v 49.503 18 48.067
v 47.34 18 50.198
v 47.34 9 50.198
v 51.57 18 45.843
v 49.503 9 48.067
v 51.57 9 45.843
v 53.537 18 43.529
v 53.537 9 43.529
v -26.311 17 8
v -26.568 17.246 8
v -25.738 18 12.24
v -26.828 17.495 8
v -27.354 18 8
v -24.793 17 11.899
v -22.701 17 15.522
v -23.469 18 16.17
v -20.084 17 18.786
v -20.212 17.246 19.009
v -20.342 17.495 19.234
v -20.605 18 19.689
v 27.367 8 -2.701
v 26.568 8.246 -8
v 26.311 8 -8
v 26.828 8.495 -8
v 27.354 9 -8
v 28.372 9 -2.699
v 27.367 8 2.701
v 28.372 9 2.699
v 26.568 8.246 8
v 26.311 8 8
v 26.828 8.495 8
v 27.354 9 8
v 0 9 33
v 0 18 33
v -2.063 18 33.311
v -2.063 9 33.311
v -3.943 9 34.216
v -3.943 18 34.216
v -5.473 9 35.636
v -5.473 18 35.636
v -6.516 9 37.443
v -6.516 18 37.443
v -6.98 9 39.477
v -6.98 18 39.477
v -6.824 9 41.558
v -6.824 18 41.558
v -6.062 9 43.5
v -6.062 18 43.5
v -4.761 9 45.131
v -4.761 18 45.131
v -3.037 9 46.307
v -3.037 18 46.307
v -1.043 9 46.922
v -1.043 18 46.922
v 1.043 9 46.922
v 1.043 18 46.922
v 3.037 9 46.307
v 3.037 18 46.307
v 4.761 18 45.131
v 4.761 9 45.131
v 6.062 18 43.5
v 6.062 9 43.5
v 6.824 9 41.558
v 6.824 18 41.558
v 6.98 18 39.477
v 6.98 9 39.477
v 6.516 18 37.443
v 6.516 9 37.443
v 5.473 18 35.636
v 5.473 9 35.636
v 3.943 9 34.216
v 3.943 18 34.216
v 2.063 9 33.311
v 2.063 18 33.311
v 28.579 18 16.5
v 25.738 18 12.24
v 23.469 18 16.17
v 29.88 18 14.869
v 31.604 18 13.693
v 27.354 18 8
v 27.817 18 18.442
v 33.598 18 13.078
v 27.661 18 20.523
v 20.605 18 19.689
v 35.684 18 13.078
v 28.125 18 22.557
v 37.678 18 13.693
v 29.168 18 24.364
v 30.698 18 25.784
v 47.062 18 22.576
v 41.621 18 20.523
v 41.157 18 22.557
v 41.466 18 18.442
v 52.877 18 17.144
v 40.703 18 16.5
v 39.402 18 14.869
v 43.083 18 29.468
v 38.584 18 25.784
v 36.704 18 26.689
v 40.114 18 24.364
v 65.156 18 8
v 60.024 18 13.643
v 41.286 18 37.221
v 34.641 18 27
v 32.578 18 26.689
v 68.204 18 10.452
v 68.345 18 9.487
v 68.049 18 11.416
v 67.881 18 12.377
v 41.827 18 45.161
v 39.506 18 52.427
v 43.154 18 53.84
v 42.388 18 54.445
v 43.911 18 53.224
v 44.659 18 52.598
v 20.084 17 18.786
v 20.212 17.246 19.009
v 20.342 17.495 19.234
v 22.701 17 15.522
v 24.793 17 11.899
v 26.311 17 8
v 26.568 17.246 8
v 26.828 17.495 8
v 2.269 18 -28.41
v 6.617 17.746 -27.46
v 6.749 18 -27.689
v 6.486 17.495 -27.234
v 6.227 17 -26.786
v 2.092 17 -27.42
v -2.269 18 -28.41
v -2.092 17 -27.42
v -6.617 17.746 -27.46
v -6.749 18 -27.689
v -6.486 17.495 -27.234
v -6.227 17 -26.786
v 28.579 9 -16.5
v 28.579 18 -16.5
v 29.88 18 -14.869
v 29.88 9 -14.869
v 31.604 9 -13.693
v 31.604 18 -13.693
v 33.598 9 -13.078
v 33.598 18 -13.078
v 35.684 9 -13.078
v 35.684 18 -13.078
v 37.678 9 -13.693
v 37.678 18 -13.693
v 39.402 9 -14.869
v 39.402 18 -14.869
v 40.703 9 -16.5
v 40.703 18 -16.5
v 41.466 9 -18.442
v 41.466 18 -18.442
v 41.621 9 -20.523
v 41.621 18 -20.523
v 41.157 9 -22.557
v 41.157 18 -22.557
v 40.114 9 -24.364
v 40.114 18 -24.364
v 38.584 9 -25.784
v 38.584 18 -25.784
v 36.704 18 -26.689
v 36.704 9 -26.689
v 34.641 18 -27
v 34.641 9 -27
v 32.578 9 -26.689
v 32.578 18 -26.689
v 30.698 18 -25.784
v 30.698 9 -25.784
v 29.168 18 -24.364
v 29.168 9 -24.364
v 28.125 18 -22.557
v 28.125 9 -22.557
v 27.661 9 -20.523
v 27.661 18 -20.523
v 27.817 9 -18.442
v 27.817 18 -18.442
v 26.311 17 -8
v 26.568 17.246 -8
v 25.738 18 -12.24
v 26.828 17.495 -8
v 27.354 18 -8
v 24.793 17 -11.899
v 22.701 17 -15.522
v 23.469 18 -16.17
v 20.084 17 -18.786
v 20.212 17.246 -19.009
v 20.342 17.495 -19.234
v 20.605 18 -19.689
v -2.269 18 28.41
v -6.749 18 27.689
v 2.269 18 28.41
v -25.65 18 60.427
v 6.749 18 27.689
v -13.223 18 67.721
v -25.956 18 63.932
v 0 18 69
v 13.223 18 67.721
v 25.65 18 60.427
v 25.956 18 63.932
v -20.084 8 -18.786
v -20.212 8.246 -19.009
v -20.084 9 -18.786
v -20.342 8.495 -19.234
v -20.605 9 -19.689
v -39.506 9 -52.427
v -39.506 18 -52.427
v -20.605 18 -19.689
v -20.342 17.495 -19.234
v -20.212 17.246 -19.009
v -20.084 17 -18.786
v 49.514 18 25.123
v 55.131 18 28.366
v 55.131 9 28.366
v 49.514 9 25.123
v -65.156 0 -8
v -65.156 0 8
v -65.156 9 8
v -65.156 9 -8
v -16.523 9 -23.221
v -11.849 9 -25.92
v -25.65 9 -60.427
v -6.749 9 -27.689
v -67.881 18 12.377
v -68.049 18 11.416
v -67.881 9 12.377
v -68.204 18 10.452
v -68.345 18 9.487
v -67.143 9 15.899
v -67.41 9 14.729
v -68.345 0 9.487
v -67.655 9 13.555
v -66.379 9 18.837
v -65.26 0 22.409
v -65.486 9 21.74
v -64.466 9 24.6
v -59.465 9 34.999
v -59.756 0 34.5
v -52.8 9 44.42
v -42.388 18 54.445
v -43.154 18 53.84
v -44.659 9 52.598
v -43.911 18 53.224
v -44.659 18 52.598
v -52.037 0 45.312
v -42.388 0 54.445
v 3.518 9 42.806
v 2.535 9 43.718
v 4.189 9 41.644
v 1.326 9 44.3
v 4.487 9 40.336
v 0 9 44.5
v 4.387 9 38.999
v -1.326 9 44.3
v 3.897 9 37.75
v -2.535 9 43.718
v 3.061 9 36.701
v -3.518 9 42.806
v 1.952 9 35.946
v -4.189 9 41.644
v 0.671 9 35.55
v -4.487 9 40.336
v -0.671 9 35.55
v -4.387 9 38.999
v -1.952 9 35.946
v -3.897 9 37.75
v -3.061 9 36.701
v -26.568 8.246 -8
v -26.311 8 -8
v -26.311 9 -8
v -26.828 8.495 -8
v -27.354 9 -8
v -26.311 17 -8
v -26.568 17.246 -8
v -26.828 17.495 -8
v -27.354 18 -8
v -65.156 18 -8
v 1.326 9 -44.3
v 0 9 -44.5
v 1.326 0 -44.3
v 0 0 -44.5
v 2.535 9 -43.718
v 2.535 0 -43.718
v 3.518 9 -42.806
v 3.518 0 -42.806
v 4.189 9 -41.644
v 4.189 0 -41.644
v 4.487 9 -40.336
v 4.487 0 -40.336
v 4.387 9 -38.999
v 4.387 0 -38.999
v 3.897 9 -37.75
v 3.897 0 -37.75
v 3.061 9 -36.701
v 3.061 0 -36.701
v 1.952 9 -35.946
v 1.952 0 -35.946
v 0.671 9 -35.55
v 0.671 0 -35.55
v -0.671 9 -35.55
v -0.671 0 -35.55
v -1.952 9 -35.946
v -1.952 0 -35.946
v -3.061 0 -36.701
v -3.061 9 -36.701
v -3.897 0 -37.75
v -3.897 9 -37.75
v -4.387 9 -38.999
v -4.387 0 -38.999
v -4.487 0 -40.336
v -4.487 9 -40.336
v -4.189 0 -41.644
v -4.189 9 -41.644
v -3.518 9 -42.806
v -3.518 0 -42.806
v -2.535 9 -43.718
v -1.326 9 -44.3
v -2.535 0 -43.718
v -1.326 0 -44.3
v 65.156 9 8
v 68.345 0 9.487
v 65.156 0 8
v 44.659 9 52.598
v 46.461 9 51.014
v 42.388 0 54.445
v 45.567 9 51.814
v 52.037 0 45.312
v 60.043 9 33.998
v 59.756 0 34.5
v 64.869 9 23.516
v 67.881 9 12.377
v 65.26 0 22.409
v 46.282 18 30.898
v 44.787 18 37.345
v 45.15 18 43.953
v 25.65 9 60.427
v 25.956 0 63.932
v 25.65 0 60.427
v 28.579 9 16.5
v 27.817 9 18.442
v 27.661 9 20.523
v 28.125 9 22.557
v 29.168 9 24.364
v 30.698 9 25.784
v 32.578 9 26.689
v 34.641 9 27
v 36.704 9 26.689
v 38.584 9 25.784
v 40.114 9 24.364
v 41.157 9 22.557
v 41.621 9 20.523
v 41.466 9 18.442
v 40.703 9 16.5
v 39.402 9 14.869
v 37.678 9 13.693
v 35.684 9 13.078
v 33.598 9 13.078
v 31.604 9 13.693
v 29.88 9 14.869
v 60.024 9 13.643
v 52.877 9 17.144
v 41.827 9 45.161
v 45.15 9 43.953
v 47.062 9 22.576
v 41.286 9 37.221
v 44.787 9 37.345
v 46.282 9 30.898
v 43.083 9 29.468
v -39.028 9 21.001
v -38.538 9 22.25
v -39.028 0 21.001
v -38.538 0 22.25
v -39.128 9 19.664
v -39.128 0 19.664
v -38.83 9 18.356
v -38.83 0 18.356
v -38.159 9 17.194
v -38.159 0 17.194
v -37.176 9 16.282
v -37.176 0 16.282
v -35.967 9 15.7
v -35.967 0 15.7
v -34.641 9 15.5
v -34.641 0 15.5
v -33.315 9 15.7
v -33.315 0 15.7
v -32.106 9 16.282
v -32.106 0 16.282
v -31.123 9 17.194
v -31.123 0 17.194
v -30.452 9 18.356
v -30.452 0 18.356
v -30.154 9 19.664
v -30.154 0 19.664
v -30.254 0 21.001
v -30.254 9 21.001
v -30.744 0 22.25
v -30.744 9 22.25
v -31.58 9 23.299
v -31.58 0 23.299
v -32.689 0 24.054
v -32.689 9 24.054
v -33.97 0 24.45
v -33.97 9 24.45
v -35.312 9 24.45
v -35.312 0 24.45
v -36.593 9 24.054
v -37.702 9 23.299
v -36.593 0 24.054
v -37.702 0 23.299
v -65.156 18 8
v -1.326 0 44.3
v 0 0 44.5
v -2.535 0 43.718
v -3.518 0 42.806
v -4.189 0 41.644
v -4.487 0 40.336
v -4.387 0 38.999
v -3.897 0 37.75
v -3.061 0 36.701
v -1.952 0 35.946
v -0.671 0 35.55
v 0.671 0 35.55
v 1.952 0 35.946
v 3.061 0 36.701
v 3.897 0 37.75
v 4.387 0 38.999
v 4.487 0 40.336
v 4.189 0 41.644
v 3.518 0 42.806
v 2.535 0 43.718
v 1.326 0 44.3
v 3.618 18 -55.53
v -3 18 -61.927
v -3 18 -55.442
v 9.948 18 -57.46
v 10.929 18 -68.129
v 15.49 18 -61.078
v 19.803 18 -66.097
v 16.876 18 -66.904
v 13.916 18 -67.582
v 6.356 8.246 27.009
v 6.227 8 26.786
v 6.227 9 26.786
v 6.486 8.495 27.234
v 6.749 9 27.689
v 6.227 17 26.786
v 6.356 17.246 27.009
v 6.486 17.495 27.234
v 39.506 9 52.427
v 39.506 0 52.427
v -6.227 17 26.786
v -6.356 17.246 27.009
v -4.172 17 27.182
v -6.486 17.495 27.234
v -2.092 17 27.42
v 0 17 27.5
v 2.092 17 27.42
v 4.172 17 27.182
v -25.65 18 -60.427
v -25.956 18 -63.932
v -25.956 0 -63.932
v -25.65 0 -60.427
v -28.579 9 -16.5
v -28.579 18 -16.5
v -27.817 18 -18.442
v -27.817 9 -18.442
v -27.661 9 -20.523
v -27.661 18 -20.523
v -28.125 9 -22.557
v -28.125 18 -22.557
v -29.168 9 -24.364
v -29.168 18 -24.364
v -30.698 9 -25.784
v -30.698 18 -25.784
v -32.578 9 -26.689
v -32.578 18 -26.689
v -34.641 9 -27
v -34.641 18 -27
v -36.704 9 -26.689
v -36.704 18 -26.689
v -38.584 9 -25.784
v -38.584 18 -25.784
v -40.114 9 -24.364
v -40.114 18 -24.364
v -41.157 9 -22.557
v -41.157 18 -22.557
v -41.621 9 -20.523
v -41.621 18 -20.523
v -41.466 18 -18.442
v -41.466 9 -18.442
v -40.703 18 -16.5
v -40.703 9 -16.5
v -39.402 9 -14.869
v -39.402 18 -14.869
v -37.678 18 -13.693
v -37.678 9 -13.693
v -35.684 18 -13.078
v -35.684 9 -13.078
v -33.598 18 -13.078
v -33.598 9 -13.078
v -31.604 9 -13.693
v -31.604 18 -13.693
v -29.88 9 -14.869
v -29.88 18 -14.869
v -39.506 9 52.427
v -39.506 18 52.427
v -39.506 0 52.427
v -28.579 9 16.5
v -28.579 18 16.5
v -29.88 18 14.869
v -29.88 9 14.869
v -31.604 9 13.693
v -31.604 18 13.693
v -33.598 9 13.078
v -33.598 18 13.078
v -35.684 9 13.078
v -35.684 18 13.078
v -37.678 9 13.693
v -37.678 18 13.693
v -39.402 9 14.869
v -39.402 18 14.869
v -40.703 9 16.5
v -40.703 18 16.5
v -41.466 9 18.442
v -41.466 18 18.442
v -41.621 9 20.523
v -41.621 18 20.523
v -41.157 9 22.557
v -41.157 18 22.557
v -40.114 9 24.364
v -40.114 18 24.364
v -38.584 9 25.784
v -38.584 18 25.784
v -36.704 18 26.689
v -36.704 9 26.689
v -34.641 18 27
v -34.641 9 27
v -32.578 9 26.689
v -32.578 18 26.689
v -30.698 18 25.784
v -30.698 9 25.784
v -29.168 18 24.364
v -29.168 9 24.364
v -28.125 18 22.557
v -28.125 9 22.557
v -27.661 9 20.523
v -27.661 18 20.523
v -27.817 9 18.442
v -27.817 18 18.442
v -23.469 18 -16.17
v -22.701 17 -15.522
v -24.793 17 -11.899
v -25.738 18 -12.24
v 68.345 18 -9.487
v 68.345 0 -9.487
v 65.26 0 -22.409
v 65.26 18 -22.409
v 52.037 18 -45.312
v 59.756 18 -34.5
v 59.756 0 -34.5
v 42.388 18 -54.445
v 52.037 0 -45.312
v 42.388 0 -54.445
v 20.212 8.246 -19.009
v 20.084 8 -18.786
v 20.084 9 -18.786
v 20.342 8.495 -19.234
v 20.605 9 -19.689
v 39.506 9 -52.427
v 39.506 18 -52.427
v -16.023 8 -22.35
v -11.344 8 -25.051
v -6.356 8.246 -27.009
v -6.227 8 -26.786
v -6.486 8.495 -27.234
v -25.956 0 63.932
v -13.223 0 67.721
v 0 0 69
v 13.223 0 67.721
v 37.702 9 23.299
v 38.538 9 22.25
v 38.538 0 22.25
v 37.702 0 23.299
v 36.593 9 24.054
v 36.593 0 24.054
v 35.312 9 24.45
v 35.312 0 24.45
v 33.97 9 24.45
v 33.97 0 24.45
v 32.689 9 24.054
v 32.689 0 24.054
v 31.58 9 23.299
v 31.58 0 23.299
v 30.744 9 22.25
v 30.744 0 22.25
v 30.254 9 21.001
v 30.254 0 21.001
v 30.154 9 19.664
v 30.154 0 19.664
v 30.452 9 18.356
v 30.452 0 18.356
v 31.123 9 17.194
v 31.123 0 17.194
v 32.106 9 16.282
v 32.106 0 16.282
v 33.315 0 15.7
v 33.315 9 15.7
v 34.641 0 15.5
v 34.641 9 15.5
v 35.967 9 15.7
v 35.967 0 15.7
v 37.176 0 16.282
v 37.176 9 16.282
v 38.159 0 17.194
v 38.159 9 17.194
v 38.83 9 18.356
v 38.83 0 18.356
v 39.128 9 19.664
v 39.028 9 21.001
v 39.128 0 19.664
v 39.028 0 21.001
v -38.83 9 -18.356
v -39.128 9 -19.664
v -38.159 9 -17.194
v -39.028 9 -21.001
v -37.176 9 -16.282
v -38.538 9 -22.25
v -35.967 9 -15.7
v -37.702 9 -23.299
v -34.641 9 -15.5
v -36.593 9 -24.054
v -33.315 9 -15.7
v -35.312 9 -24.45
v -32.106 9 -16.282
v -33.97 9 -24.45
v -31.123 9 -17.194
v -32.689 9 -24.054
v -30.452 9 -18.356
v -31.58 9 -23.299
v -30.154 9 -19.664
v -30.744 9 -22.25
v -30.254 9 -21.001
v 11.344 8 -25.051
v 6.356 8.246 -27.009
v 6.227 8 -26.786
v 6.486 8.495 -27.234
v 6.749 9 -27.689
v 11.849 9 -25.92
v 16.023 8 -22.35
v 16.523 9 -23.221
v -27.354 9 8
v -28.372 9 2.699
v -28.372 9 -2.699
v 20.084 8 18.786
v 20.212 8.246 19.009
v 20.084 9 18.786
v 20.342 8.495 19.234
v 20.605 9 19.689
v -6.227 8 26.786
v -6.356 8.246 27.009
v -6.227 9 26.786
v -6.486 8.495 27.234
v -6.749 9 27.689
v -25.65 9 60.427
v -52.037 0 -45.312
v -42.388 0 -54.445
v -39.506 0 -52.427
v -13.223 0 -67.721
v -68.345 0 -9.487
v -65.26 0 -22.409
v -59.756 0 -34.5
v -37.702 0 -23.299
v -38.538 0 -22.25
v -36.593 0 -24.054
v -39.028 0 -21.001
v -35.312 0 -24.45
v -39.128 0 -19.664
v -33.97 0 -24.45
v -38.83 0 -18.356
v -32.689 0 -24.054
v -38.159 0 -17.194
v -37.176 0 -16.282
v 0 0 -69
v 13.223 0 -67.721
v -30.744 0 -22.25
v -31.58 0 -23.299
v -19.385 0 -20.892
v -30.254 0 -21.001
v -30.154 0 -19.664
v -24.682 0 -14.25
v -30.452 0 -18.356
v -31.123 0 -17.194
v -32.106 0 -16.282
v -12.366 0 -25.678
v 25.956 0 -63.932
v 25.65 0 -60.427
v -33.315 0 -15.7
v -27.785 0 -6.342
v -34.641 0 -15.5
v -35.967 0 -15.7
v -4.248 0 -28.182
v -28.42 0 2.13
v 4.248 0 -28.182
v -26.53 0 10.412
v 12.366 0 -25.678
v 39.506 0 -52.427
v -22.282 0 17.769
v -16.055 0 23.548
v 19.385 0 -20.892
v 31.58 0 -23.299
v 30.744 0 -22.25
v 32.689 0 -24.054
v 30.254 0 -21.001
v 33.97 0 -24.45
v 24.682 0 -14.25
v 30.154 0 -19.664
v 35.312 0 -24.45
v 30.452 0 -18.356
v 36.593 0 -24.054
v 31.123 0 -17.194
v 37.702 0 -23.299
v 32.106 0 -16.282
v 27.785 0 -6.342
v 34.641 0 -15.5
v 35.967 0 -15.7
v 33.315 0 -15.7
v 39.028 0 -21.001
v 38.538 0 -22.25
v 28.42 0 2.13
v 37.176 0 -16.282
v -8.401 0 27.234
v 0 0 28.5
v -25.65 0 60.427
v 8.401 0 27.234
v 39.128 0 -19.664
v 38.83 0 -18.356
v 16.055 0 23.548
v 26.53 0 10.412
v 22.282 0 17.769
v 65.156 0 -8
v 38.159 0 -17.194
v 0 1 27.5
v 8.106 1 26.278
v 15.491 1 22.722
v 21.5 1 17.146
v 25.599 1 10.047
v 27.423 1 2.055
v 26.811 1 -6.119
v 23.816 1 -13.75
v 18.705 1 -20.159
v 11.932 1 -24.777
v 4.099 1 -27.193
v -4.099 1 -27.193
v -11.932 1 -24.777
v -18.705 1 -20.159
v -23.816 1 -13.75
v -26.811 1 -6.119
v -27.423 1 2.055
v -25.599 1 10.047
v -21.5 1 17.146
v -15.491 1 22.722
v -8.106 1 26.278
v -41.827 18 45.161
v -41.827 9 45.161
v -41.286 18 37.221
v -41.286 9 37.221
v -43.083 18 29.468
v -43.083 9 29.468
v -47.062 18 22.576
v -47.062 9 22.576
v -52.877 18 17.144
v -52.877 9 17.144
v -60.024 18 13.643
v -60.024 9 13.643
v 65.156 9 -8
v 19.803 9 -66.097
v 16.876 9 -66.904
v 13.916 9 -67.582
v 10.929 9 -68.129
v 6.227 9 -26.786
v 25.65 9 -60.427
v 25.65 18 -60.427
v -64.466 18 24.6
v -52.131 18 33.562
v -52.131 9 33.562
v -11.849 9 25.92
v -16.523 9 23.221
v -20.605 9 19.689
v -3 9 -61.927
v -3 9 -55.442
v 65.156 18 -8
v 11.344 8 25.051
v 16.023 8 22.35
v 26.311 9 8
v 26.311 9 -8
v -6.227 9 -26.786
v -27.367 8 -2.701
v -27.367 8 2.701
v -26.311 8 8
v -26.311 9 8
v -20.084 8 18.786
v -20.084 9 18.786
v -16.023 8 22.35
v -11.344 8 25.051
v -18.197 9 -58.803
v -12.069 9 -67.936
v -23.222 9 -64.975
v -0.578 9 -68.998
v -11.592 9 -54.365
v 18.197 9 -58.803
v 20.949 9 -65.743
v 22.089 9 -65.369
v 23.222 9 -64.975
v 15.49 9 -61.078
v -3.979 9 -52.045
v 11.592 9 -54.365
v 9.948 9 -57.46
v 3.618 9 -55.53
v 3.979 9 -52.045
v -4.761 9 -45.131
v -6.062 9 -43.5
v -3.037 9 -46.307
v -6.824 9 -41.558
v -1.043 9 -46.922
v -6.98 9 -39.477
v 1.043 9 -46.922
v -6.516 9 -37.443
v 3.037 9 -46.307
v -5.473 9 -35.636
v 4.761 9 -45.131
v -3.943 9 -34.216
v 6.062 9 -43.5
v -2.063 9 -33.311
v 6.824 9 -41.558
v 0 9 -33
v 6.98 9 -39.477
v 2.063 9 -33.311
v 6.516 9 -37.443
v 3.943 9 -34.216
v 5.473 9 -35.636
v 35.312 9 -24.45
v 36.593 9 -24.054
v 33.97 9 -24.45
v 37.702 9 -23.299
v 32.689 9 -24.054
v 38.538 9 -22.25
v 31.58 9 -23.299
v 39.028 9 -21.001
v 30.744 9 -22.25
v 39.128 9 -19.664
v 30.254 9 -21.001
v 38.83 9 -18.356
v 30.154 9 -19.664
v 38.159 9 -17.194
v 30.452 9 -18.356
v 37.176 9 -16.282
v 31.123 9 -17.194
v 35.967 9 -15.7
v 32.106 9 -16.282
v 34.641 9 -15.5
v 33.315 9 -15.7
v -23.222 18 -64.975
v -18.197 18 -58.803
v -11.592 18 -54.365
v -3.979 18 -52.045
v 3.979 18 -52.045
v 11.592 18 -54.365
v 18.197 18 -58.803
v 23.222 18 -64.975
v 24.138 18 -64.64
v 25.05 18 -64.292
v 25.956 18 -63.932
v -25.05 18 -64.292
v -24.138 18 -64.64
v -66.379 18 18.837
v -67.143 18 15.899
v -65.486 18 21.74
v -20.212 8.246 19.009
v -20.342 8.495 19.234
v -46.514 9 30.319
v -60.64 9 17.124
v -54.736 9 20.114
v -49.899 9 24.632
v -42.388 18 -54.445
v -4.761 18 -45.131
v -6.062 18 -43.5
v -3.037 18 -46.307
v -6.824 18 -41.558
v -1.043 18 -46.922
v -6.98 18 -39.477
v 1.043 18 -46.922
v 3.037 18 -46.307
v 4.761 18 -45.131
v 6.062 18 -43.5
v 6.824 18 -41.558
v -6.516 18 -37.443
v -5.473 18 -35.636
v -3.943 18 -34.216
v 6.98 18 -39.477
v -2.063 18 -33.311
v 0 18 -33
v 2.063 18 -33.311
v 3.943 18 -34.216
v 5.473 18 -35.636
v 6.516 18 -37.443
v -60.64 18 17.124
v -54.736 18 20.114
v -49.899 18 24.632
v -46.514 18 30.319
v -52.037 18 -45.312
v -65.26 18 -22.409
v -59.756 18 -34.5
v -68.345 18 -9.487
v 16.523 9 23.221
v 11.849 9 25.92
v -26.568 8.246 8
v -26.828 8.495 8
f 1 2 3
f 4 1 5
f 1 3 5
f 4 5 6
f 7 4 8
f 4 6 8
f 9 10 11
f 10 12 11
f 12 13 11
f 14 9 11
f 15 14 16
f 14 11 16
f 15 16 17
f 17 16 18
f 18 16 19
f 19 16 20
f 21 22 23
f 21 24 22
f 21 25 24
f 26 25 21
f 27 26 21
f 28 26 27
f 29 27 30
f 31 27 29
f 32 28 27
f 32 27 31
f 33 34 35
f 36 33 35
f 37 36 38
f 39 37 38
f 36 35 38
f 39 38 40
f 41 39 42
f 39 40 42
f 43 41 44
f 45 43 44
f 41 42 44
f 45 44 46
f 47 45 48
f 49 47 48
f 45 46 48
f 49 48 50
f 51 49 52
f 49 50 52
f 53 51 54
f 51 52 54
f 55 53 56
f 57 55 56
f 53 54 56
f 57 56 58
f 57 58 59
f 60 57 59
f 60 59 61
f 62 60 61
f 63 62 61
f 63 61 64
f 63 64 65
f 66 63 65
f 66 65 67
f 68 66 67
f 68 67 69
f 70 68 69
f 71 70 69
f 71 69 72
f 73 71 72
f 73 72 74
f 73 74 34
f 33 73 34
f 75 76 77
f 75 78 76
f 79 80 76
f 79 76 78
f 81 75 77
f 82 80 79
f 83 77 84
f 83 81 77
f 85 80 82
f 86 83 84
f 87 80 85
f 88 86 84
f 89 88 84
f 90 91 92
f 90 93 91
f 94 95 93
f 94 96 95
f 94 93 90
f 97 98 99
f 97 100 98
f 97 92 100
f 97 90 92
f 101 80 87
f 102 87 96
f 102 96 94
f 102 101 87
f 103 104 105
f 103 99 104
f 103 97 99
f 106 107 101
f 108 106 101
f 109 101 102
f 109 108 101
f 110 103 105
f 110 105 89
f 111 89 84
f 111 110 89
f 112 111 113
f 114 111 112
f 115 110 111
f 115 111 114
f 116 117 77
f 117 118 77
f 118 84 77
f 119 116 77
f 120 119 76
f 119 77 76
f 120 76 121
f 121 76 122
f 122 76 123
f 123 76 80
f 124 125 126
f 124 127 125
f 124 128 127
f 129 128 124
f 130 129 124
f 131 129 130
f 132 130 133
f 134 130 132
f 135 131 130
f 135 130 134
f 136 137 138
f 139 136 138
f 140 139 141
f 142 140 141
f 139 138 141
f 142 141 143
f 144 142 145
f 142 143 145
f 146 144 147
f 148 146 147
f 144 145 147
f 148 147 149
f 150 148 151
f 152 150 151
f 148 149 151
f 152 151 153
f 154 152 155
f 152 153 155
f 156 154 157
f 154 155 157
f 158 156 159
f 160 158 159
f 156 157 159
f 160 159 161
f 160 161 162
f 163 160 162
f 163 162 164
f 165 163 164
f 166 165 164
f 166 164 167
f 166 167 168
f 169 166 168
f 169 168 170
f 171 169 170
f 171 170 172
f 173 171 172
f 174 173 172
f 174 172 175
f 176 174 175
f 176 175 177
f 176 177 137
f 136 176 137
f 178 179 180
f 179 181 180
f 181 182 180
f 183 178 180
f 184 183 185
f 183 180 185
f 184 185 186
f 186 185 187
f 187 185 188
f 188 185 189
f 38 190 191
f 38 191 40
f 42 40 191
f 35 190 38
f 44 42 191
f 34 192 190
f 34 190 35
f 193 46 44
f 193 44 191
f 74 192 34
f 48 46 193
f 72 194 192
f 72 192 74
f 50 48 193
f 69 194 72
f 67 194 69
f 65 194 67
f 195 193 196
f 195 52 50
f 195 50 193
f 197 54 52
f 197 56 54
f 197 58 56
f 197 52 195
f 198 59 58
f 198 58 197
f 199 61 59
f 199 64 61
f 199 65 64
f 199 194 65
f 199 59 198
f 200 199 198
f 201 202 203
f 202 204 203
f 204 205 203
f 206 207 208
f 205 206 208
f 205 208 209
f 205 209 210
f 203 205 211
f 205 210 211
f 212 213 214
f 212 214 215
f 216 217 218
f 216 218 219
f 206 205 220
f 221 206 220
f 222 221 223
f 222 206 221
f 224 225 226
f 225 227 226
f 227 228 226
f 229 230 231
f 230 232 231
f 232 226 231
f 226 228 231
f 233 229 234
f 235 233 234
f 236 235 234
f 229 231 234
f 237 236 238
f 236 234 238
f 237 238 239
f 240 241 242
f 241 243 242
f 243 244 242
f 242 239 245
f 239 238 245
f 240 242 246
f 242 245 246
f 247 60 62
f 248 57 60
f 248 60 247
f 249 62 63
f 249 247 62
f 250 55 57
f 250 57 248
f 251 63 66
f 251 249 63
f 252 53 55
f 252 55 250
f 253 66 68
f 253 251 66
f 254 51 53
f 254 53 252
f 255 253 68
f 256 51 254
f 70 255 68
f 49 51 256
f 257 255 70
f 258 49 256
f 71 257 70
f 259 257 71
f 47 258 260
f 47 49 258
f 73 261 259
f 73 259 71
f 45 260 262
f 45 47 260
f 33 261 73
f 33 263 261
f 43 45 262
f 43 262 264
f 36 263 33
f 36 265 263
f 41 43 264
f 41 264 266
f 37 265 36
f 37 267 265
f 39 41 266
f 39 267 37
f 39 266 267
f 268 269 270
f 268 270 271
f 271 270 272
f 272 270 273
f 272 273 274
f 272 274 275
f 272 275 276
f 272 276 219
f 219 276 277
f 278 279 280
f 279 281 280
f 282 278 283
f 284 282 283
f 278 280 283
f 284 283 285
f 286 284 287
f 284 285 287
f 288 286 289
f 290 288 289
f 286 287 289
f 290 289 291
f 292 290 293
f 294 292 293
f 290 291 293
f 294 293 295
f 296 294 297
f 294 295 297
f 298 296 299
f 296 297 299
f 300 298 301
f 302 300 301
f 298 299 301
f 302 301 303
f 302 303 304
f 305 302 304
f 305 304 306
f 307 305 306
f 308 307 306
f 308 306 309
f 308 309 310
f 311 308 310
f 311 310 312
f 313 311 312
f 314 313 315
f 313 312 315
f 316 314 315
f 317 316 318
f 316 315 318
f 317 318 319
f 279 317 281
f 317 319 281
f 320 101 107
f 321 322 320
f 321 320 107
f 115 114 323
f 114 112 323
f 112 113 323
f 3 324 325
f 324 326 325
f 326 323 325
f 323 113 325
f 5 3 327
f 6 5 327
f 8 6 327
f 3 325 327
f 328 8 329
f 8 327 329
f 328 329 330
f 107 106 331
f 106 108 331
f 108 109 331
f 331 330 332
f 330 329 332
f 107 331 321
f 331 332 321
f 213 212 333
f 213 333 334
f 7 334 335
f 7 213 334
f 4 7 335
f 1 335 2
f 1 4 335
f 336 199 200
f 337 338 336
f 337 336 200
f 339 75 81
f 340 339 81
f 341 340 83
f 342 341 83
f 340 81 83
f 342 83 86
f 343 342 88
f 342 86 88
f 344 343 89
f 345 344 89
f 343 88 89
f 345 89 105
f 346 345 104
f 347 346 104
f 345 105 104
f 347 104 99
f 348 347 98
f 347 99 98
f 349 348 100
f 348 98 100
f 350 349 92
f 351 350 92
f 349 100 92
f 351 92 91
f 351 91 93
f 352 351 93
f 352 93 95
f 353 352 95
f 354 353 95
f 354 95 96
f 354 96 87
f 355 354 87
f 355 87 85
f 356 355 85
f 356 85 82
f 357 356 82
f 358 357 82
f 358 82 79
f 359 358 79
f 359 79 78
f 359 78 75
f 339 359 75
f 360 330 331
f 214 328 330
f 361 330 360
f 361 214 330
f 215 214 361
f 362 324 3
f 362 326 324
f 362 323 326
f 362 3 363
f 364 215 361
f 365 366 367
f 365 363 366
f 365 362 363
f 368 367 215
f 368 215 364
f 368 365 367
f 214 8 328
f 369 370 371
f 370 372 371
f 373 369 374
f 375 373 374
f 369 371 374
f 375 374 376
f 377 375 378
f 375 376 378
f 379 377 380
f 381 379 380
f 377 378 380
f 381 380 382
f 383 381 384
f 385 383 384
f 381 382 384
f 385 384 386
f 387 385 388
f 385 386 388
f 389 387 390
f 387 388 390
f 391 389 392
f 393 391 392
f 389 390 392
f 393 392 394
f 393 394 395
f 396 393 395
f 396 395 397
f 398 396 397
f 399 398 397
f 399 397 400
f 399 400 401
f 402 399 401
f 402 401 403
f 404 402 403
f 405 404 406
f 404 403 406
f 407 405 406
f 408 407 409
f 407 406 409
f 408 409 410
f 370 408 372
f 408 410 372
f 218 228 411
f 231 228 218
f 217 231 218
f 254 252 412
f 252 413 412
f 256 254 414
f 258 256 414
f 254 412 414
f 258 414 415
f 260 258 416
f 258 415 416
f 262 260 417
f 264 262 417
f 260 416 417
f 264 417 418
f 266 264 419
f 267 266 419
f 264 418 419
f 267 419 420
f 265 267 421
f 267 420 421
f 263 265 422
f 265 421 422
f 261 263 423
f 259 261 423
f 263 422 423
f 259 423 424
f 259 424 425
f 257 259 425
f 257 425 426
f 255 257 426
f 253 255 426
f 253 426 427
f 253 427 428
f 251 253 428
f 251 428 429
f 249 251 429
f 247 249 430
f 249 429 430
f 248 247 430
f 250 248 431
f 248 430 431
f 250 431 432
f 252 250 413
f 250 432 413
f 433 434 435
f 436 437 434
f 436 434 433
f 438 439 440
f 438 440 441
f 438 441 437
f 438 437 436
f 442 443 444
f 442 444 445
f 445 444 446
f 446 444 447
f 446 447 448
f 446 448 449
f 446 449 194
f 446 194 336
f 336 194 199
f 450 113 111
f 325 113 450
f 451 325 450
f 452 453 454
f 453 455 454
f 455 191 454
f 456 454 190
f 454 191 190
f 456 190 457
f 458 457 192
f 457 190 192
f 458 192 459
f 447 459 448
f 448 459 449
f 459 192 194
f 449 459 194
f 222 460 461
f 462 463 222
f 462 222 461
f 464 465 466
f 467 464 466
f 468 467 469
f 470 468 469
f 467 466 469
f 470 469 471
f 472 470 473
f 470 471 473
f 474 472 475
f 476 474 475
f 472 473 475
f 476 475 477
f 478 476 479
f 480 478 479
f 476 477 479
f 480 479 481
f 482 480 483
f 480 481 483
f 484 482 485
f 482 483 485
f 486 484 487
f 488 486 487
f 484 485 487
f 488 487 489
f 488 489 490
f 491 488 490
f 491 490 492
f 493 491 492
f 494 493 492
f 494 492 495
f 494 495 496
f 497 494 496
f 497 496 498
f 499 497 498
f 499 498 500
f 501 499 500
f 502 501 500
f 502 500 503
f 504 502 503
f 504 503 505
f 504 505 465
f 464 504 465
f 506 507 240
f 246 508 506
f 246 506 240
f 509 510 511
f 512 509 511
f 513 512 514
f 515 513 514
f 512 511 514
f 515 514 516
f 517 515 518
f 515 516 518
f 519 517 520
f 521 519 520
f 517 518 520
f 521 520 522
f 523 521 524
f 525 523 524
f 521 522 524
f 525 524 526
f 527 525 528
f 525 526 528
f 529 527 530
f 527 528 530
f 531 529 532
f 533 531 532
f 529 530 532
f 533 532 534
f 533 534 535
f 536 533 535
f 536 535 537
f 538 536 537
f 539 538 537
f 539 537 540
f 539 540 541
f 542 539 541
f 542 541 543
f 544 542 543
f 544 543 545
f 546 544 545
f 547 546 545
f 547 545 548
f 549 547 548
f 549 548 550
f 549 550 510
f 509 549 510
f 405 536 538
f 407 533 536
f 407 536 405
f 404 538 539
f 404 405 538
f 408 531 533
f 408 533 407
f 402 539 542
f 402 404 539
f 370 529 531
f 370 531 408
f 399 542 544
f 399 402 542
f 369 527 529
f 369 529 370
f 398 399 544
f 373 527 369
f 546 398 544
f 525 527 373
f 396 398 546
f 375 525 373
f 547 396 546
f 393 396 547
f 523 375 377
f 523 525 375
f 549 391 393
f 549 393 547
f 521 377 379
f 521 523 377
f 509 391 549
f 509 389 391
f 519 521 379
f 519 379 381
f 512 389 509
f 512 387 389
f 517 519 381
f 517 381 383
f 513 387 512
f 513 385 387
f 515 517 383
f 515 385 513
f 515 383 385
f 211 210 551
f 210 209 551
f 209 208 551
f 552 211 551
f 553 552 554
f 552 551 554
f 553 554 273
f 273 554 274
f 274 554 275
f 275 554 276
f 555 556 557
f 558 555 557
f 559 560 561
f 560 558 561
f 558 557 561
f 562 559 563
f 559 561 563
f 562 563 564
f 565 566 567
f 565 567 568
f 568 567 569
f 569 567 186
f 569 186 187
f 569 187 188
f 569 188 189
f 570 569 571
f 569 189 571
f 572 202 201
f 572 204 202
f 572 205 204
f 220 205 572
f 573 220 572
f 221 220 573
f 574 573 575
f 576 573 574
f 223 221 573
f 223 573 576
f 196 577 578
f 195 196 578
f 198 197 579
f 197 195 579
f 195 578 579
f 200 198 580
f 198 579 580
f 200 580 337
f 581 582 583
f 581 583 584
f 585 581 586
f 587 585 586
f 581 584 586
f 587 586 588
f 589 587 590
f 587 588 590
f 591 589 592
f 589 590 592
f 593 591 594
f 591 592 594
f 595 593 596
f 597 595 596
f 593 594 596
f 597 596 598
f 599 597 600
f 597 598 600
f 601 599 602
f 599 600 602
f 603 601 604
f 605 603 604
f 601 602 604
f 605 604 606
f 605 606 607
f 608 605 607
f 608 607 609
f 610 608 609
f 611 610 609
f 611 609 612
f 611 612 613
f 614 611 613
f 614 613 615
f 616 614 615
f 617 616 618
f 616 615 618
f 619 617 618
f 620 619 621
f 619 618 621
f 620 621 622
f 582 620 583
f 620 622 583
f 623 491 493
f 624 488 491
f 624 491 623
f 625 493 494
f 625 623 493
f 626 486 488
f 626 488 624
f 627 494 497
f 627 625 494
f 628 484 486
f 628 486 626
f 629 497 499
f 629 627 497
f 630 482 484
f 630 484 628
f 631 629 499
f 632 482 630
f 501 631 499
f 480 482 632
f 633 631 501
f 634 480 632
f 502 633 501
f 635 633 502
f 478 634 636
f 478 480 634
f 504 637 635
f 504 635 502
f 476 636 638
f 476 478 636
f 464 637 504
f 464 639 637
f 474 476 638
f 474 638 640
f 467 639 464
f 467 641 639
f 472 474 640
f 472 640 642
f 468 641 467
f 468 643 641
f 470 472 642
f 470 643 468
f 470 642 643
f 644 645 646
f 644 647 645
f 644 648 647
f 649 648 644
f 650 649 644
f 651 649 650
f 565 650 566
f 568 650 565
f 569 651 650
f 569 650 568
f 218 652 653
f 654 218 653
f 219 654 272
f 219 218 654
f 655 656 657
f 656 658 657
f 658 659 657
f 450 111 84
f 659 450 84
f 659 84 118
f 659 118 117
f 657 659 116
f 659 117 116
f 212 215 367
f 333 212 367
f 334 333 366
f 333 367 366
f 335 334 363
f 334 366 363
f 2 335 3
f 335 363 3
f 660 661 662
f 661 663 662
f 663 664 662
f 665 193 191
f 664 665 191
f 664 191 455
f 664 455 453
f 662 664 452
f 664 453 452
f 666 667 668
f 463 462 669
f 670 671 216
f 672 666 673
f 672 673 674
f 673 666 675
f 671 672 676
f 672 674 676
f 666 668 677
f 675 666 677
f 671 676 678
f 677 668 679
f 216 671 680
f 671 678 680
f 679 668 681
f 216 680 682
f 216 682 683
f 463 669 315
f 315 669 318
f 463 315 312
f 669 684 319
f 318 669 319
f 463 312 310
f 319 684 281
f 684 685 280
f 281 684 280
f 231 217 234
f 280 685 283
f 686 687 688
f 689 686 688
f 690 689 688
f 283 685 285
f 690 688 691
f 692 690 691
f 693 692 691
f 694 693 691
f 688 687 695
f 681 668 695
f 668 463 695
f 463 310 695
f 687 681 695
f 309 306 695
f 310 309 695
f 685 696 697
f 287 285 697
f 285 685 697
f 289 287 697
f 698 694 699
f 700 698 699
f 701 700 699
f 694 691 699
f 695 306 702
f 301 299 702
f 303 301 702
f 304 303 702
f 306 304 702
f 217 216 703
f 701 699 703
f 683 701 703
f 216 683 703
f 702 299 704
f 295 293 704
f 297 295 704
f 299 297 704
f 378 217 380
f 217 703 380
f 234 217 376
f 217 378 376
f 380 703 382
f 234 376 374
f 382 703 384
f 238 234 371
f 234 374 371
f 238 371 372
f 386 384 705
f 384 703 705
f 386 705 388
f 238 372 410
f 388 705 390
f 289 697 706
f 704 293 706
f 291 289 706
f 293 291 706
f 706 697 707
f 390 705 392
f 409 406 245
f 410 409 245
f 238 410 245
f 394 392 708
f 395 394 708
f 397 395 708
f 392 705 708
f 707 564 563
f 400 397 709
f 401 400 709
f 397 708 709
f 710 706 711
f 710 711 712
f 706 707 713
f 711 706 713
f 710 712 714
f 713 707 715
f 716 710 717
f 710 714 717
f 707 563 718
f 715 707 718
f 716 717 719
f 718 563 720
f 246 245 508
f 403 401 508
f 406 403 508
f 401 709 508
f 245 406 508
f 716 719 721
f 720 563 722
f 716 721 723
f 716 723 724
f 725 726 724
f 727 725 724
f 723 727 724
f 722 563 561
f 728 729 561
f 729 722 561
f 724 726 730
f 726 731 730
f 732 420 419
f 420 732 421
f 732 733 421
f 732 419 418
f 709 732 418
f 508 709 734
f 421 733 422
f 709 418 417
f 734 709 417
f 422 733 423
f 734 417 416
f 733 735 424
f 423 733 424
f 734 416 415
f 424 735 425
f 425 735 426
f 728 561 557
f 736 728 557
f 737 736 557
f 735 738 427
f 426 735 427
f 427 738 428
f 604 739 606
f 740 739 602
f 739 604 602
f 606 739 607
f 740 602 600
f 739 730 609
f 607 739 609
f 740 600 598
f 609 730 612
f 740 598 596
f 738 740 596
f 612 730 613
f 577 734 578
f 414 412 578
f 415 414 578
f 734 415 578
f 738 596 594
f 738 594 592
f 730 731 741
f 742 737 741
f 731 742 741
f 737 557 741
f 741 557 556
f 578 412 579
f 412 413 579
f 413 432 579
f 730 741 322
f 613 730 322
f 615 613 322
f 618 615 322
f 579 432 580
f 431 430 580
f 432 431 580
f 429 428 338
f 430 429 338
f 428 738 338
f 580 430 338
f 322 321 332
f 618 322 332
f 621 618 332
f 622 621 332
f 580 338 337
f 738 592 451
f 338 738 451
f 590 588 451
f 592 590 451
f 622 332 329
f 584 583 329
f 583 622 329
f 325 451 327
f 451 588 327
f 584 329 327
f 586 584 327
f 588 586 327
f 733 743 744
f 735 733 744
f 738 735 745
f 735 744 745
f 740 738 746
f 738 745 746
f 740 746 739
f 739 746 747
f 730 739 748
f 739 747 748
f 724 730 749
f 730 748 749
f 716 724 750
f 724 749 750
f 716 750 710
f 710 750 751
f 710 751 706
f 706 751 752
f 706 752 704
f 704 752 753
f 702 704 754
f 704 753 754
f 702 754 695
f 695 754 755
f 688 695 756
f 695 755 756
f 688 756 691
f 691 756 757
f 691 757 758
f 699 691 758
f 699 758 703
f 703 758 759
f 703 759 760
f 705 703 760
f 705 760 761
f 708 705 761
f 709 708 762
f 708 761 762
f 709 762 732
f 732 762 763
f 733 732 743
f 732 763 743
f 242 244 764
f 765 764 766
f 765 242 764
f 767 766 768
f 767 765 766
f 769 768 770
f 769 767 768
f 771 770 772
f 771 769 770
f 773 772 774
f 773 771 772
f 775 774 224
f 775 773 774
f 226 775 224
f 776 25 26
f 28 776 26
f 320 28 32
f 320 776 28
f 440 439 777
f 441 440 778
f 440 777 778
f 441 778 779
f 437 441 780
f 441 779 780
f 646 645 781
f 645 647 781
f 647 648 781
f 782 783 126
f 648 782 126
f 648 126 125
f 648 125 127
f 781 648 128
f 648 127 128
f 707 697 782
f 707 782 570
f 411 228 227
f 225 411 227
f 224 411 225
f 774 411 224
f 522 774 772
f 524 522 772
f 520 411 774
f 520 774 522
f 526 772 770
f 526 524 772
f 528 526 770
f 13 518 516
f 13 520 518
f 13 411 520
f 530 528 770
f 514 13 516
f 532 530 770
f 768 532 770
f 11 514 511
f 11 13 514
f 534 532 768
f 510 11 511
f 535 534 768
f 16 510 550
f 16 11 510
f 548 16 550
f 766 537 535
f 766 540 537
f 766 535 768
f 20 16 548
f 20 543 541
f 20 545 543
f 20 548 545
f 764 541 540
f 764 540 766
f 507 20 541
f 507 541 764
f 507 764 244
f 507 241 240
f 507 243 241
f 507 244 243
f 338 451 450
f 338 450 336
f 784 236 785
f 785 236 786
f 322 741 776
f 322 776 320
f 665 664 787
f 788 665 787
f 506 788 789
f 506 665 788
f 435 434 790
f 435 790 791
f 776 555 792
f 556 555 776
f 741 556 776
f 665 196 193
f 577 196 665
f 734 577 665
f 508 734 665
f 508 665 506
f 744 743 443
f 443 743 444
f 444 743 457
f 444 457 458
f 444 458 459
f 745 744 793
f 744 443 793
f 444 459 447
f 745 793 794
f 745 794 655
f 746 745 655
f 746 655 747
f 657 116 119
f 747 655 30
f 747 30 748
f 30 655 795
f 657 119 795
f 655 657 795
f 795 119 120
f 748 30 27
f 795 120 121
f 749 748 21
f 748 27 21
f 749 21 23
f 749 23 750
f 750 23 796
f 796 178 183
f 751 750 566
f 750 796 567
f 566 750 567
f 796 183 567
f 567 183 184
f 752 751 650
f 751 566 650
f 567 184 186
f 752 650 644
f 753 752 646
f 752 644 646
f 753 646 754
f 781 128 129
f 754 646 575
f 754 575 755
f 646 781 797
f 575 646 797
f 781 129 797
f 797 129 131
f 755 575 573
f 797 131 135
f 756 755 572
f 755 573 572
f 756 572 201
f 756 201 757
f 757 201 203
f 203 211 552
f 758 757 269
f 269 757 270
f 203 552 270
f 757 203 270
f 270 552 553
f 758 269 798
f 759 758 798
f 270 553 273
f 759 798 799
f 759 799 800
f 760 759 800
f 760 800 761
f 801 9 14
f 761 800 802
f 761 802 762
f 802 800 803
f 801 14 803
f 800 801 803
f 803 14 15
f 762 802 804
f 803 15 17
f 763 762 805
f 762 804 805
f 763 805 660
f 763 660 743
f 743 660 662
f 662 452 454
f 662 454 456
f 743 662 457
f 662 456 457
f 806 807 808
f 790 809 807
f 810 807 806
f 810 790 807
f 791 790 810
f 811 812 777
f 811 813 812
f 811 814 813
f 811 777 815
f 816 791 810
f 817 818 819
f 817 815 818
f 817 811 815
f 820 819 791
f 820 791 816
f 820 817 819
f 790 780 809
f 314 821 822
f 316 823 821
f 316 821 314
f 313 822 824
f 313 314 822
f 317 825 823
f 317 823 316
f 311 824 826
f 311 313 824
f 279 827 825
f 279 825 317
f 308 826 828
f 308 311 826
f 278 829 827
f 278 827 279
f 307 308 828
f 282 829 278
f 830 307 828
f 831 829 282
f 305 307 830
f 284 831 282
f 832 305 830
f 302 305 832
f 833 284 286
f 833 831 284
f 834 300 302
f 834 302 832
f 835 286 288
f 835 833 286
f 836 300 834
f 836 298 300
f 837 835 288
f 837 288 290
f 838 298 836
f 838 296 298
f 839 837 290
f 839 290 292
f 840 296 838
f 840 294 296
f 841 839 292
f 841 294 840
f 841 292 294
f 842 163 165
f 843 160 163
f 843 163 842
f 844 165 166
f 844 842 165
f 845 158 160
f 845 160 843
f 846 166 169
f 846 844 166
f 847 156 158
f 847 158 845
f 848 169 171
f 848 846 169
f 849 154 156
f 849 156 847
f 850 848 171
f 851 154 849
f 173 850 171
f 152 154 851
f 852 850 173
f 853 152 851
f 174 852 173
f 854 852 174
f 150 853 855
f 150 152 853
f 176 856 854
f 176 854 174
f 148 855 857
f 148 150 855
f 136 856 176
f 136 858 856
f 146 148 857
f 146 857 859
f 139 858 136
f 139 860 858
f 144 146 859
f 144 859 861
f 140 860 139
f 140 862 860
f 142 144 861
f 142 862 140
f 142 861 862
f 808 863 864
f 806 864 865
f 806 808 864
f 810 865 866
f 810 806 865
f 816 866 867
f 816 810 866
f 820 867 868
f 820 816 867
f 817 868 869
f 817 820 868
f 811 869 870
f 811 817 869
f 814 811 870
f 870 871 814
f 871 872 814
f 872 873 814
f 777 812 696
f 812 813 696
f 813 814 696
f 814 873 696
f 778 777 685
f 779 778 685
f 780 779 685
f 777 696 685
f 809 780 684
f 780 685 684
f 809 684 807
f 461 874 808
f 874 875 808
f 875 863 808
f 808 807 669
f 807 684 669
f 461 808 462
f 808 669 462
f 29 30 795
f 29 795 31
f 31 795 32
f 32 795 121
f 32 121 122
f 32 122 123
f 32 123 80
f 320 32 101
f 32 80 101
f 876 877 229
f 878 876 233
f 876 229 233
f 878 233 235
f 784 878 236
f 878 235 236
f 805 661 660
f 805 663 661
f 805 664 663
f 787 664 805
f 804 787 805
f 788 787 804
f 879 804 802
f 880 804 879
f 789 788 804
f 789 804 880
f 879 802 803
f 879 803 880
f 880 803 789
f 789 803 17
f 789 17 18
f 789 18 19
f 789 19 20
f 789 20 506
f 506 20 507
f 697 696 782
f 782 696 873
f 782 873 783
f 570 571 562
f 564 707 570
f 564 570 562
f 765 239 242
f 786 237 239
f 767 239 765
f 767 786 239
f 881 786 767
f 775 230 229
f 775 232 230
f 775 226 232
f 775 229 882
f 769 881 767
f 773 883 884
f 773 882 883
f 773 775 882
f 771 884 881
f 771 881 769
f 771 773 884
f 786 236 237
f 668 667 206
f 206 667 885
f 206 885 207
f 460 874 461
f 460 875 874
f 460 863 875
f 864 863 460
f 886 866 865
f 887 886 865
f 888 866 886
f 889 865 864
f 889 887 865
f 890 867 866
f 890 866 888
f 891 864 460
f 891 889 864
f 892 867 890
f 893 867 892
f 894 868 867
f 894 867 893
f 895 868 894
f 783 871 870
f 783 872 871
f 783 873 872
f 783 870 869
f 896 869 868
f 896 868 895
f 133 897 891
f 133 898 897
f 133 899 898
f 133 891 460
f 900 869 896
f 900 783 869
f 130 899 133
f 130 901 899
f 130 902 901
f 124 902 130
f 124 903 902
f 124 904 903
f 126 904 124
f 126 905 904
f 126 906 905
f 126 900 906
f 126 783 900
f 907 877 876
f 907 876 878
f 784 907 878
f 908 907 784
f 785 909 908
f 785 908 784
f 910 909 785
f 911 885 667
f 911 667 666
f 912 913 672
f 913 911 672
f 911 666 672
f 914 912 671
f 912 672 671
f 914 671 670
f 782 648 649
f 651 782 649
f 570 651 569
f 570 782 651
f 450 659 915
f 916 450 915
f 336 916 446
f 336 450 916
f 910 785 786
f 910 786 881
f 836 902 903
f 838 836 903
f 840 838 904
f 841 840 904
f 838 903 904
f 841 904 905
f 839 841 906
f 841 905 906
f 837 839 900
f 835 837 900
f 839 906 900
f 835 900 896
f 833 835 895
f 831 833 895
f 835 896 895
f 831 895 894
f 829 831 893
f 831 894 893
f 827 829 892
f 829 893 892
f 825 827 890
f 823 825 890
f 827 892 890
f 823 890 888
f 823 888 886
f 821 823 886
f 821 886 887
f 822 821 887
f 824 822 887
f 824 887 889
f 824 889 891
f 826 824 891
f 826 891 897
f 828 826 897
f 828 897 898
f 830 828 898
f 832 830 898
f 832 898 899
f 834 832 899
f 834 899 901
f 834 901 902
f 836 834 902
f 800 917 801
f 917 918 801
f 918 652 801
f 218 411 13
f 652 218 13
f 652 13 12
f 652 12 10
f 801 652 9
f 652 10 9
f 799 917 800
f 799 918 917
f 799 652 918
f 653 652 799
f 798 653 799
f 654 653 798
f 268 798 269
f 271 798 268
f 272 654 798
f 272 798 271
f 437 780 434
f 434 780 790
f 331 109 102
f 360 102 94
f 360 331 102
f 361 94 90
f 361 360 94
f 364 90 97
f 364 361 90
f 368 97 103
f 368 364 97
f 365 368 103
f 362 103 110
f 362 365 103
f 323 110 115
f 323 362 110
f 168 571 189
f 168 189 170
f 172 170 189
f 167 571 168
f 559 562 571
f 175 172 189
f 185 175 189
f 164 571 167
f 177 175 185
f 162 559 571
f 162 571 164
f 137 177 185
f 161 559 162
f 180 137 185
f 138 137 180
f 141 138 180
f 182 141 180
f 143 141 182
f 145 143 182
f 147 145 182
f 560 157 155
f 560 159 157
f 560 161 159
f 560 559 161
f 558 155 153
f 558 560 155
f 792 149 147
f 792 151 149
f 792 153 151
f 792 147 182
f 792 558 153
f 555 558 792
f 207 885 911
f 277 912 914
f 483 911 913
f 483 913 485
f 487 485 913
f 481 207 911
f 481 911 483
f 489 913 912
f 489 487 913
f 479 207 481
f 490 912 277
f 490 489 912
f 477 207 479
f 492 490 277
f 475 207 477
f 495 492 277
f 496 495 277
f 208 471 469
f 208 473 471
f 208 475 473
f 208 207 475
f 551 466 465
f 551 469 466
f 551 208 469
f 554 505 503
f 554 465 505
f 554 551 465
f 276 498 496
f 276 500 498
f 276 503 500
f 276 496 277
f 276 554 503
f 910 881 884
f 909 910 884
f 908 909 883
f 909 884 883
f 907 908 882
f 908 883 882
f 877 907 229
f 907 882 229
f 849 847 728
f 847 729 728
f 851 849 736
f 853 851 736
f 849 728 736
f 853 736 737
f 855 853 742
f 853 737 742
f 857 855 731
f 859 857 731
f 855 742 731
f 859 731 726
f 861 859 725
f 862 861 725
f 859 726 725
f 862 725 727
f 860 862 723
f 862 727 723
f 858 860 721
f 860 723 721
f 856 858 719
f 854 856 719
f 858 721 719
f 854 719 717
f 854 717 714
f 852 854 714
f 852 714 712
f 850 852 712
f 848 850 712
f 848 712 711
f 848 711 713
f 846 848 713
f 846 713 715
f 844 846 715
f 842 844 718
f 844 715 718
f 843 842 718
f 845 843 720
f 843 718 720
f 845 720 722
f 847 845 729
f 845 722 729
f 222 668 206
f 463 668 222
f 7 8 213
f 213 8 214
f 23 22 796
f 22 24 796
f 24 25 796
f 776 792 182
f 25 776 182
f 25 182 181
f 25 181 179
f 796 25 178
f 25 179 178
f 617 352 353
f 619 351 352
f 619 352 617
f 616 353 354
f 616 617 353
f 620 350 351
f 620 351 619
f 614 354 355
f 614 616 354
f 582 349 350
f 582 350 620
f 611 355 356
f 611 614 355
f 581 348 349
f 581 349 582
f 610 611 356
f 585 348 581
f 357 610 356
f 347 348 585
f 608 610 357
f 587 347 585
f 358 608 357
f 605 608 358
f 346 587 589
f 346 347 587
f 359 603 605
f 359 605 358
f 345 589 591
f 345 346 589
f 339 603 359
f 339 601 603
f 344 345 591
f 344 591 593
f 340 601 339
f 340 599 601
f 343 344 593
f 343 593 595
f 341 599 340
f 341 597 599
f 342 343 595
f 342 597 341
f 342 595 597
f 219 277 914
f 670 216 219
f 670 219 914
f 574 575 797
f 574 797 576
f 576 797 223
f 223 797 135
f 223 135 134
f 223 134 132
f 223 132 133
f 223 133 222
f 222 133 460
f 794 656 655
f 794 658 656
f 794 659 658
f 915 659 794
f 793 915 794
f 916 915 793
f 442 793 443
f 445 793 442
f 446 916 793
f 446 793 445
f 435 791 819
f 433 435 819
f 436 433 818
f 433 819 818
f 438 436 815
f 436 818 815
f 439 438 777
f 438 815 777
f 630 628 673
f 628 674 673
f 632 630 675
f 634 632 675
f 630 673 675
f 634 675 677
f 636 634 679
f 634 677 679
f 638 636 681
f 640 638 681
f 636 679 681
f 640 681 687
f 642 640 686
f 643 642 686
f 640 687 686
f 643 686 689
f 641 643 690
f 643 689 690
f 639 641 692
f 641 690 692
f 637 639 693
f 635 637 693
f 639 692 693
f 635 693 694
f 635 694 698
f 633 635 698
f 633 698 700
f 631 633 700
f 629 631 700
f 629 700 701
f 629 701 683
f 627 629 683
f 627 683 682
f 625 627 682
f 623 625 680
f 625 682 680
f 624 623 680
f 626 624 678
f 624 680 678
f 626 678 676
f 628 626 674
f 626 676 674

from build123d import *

# Parameters (mm, degrees)
SKETCH1_R                               = 69
BOSS_EXTRUDE1_DEPTH                     = 18
SKETCH2_R                               = 27.5
CUT_EXTRUDE1_DEPTH                      = 100.227012451
CUT_EXTRUDE2_DEPTH                      = 9
CUT_EXTRUDE3_START                      = -9
CUT_EXTRUDE3_DEPTH                      = 9
CIRPATTERN1_COUNT                       = 6
CUT_EXTRUDE4_START                      = -9
SKETCH5_R                               = 27
CUT_EXTRUDE4_DEPTH                      = 9
CIRPATTERN2_COUNT                       = 3
CBORE_FOR_M5_HEX_HEAD_BOLT1_D           = 9
CBORE_FOR_M5_HEX_HEAD_BOLT1_CBORE_D     = 14
CBORE_FOR_M5_HEX_HEAD_BOLT1_CBORE_DEPTH = 9
CIRPATTERN3_COUNT                       = 6
CHAMFER1_SIZE                           = 1


with BuildPart() as part:
    # Sketch1 → Boss-Extrude1 (new body)
    with BuildSketch(Plane(origin=(0, 0, 0), x_dir=(1, 0, 0), z_dir=(0, 1, 0))):
        with Locations(Location((0, 0, 0), (0, 0, 270))):
            Circle(SKETCH1_R)
    extrude(amount=BOSS_EXTRUDE1_DEPTH)

    # Sketch2 → Cut-Extrude1 (cut, through all)
    with BuildSketch(Plane(origin=(0, 18, 0), x_dir=(1, 0, 0), z_dir=(0, 1, 0))):
        with Locations(Location((0, 0, 0), (0, 0, 270))):
            Circle(SKETCH2_R)
    extrude(amount=-CUT_EXTRUDE1_DEPTH, mode=Mode.SUBTRACT)

    # Sketch3 → Cut-Extrude2 (cut)
    with BuildSketch(Plane(origin=(0, 18, 0), x_dir=(1, 0, 0), z_dir=(0, 1, 0))):
        with BuildLine():
            Line((-39.506230912, 52.426799156), (-20.083525347, 18.785686296))
            ThreePointArc((-20.083525347, 18.785686296), (-13.75, 23.815698604), (-6.227118887, 26.785686296))
            Line((-6.227118887, 26.785686296), (-25.649824452, 60.426799156))
            Line((-25.649824452, 60.426799156), (-25.956463368, 63.931698002))
            ThreePointArc((-25.956463368, 63.931698002), (-34.5, 59.755752861), (-42.388242893, 54.44480567))
            Line((-42.388242893, 54.44480567), (-39.506230912, 52.426799156))
        make_face()
    cut_extrude2 = extrude(amount=-CUT_EXTRUDE2_DEPTH, mode=Mode.SUBTRACT)

    # Sketch4 → Cut-Extrude3 (cut)
    with BuildSketch(Plane(origin=(0, 9, 0), x_dir=(1, 0, 0), z_dir=(0, 1, 0)).offset(CUT_EXTRUDE3_START)):
        with BuildLine():
            Line((-39.506230912, 52.426799156), (-25.649824452, 60.426799156))
            Line((-25.649824452, 60.426799156), (-25.956463368, 63.931698002))
            ThreePointArc((-25.956463368, 63.931698002), (-34.5, 59.755752861), (-42.388242893, 54.44480567))
            Line((-42.388242893, 54.44480567), (-39.506230912, 52.426799156))
        make_face()
    cut_extrude3 = extrude(amount=CUT_EXTRUDE3_DEPTH, mode=Mode.SUBTRACT)

    # CirPattern1: Cut-Extrude2, Cut-Extrude3 ×6 about axis
    cirpattern1_axis = Axis((0, 0, 0), (0, 1, 0))
    add([cut_extrude2.rotate(cirpattern1_axis, i * 360 / CIRPATTERN1_COUNT) for i in range(1, CIRPATTERN1_COUNT)], mode=Mode.SUBTRACT)
    add([cut_extrude3.rotate(cirpattern1_axis, i * 360 / CIRPATTERN1_COUNT) for i in range(1, CIRPATTERN1_COUNT)], mode=Mode.SUBTRACT)

    # Sketch5 → Cut-Extrude4 (cut)
    with BuildSketch(Plane(origin=(0, 18, 0), x_dir=(1, 0, 0), z_dir=(0, 1, 0)).offset(CUT_EXTRUDE4_START)):
        with Locations((-68.199500548, -39.375)):
            Circle(SKETCH5_R)
        with BuildLine():
            Line((-52.130681517, -33.561764622), (-46.514419424, -30.319214191))
            ThreePointArc((-46.514419424, -30.319214191), (-54.735535714, -20.114375634), (-67.143353435, -15.898744905))
            ThreePointArc((-67.143353435, -15.898744905), (-65.948291272, -20.29341958), (-64.465924789, -24.599685792))
            Line((-64.465924789, -24.599685792), (-52.130681517, -33.561764622))
        make_face(mode=Mode.SUBTRACT)
    cut_extrude4 = extrude(amount=CUT_EXTRUDE4_DEPTH, mode=Mode.SUBTRACT)

    # CirPattern2: Cut-Extrude4 ×3 about axis
    cirpattern2_axis = Axis((0, 0, 0), (0, 1, 0))
    for i in range(1, CIRPATTERN2_COUNT):
        add(cut_extrude4.rotate(cirpattern2_axis, i * 360 / CIRPATTERN2_COUNT), mode=Mode.SUBTRACT)

    # CBORE for M5 Hex Head Bolt1 (through all)
    with Locations(Plane(origin=(0, 18, -40), x_dir=(0, 0, 1), z_dir=(0, 1, 0))):
        with Locations((0, 0)):
            cbore_for_m5_hex_head_bolt1 = CounterBoreHole(CBORE_FOR_M5_HEX_HEAD_BOLT1_D / 2, CBORE_FOR_M5_HEX_HEAD_BOLT1_CBORE_D / 2, CBORE_FOR_M5_HEX_HEAD_BOLT1_CBORE_DEPTH)

    # CirPattern3: CBORE for M5 Hex Head Bolt1 ×6 about axis
    cirpattern3_axis = Axis((0, 0, 0), (0, 1, 0))
    for i in range(1, CIRPATTERN3_COUNT):
        add(cbore_for_m5_hex_head_bolt1.rotate(cirpattern3_axis, i * 360 / CIRPATTERN3_COUNT), mode=Mode.SUBTRACT)

    # Chamfer1
    chamfer1_edges = [part.edges().sort_by_distance(p)[0] for p in [
        (-23.815698604, 18, -13.75),
        (-27.5, 9, 0),
        (-13.75, 9, -23.815698604),
        (-23.815698604, 18, 13.75),
        (3.133977253, 18, 27.320837955),
        (23.815698604, 18, 13.75),
        (23.815698604, 18, -13.75),
        (0, 18, -27.5),
        (0, 0, -27.5),
        (13.75, 9, -23.815698604),
        (27.5, 9, 0),
        (13.75, 9, 23.815698604),
        (-13.75, 9, 23.815698604),
    ]]
    chamfer(chamfer1_edges, length=CHAMFER1_SIZE)


solid = part.part
